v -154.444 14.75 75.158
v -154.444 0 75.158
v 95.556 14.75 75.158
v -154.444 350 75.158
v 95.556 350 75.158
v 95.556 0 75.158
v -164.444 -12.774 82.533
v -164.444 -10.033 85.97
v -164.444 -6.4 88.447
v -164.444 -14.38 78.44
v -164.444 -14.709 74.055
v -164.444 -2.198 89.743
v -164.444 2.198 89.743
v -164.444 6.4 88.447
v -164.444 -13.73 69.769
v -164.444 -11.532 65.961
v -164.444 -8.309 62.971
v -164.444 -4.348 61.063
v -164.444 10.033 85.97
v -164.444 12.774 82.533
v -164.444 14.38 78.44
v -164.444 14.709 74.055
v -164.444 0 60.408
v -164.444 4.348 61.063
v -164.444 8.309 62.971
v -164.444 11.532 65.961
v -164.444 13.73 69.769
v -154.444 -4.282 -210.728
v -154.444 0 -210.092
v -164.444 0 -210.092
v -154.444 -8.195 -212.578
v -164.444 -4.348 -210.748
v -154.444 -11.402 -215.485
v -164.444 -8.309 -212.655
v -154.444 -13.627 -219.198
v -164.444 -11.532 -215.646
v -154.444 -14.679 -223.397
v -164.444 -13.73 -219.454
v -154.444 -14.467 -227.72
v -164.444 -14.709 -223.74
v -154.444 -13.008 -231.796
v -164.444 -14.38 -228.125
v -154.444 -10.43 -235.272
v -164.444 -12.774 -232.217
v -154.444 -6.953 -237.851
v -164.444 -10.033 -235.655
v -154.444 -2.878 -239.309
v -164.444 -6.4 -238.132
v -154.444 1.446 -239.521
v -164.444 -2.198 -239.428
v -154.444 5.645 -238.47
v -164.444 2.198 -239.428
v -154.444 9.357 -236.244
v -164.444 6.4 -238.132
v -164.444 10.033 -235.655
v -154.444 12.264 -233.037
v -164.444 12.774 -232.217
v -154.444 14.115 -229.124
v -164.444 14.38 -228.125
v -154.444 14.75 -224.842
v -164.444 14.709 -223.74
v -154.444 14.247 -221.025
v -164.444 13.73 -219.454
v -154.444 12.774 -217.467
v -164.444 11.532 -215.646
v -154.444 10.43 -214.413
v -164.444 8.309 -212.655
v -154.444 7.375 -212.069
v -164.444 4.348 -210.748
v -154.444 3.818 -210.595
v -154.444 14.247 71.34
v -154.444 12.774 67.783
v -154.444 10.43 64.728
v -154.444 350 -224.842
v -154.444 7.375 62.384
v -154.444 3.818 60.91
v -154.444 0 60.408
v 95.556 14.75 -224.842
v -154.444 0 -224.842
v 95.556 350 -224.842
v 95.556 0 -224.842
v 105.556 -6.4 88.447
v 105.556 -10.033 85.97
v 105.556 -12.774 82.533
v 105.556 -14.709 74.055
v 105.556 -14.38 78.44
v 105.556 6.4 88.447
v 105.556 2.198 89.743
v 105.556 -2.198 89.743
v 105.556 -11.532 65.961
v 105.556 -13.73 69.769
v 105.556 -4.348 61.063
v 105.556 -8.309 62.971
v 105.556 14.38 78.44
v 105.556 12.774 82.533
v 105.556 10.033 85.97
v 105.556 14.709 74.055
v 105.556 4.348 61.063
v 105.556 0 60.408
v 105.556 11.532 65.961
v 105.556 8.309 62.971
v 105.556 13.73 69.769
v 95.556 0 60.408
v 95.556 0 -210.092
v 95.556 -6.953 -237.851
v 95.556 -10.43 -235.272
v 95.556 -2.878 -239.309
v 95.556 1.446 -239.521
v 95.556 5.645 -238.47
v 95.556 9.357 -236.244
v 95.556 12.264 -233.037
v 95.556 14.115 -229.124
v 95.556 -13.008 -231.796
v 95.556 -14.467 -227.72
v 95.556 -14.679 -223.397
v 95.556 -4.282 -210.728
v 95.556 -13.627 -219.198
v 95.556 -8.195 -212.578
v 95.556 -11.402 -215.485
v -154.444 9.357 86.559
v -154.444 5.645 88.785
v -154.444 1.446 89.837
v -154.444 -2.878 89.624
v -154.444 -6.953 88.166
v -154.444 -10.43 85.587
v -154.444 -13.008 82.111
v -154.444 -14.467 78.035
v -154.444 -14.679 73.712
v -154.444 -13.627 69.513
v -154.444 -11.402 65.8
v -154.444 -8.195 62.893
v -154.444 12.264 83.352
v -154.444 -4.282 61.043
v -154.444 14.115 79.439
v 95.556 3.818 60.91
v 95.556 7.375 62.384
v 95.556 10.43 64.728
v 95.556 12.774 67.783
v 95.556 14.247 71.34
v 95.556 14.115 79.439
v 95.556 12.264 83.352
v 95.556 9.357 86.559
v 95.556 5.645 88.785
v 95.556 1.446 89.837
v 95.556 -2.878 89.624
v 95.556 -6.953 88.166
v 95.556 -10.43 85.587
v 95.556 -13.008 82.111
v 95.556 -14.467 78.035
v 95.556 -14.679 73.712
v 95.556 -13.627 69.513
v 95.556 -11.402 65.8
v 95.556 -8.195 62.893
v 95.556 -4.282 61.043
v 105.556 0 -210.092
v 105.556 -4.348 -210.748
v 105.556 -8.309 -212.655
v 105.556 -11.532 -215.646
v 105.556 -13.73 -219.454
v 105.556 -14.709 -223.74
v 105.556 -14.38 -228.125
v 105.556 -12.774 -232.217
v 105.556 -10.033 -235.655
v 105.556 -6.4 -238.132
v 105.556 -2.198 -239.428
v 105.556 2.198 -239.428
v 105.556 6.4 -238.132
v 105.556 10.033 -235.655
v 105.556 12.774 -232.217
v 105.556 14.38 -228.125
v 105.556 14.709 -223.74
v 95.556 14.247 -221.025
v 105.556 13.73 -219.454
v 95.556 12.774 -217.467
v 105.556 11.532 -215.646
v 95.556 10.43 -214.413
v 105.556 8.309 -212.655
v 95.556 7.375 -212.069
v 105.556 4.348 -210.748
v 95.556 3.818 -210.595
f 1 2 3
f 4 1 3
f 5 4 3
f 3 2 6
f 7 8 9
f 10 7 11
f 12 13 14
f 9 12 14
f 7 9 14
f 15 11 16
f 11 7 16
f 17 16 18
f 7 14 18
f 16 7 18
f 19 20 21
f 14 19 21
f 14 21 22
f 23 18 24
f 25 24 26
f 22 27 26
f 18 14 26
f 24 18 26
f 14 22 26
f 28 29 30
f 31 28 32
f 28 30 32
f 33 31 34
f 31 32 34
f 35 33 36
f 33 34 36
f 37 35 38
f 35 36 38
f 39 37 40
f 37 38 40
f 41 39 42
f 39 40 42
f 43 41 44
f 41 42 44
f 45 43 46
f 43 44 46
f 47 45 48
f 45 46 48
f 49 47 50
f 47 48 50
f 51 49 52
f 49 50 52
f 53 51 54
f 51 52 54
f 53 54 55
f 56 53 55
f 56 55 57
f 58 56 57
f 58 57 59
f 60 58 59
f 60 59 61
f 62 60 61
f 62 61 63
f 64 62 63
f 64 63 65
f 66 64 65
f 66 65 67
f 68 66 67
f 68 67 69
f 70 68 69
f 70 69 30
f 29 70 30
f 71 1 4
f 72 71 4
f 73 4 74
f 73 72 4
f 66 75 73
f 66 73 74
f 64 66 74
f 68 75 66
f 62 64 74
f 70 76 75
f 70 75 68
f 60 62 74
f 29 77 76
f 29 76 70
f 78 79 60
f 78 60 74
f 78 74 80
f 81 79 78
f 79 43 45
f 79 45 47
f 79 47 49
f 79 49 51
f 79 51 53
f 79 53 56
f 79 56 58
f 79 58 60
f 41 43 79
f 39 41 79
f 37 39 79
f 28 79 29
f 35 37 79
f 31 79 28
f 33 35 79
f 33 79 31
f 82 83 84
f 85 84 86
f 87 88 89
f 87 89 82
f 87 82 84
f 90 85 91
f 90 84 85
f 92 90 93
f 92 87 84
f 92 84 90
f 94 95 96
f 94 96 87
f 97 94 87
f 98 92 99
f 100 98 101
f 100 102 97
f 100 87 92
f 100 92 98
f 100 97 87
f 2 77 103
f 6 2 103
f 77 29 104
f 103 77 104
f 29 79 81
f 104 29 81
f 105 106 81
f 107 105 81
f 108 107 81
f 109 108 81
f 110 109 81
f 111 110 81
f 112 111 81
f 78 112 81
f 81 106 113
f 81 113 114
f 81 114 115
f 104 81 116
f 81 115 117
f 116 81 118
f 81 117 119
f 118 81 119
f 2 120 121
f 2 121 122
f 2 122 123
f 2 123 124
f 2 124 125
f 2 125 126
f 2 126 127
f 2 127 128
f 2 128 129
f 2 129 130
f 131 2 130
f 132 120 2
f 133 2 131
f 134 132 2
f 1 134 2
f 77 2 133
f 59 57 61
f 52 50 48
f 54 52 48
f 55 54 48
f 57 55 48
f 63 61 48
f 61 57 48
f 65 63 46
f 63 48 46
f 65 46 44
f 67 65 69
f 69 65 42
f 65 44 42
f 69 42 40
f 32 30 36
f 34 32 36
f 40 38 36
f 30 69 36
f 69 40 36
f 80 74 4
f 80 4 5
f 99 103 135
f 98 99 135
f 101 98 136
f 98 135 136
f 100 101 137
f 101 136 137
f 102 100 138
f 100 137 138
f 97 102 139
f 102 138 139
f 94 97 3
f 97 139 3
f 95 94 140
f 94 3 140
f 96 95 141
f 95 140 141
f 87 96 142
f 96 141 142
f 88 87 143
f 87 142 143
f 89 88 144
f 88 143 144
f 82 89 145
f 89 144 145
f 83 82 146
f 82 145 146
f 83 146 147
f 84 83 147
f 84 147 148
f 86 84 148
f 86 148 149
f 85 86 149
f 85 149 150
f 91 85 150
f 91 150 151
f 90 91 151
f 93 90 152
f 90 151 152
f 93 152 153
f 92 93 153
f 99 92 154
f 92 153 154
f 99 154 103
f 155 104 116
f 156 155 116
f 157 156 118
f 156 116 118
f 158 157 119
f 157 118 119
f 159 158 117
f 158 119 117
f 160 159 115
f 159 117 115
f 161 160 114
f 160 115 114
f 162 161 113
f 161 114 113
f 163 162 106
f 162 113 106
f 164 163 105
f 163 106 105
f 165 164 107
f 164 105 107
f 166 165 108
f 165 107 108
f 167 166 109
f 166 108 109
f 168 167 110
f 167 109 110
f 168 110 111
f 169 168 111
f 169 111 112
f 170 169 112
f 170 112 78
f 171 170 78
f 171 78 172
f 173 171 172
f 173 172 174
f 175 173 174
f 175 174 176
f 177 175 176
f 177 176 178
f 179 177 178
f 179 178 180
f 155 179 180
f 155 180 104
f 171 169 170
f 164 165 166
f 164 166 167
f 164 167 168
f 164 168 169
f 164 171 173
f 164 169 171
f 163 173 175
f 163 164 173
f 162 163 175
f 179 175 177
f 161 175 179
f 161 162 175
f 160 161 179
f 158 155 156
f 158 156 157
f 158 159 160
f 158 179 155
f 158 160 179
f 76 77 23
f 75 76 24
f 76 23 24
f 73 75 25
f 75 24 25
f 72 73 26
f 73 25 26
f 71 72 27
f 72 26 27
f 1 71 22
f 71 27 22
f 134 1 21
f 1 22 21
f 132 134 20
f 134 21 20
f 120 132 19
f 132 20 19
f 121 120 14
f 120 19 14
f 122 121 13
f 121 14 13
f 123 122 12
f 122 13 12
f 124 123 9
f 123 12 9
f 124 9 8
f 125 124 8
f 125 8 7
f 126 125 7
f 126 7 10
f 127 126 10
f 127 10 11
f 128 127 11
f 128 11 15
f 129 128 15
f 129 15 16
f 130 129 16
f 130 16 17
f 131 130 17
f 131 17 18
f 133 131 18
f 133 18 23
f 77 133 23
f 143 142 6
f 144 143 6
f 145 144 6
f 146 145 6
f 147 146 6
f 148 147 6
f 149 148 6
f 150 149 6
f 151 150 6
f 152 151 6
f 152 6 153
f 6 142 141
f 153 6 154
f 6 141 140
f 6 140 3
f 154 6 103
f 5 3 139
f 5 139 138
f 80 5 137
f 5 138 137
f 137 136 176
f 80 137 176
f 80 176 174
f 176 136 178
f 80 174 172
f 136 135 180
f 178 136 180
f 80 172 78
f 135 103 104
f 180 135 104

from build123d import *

# Parameters (mm, degrees)
SKETCH1_W           = 250
SKETCH1_H           = 300
BOSS_EXTRUDE1_DEPTH = 350
SKETCH2_R           = 14.75
BOSS_EXTRUDE2_DEPTH = 10
LPATTERN2_COUNT     = 2
LPATTERN2_PITCH     = 260


with BuildPart() as part:
    # Sketch1 → Boss-Extrude1 (new body)
    with BuildSketch(Plane(origin=(0, 0, 0), x_dir=(1, 0, 0), z_dir=(0, 1, 0))):
        with Locations((-29.444356891, 74.84242821)):
            Rectangle(SKETCH1_W, SKETCH1_H)
    extrude(amount=BOSS_EXTRUDE1_DEPTH)

    # Sketch2 → Boss-Extrude2 (add)
    with BuildSketch(Plane(origin=(95.555643109, 0, 0), x_dir=(0, 0, -1), z_dir=(1, 0, 0))):
        with Locations((-75.15757179, 0)):
            Circle(SKETCH2_R)
        with Locations(Location((224.84242821, 0, 0), (0, 0, 180))):
            Circle(SKETCH2_R)
    boss_extrude2 = extrude(amount=BOSS_EXTRUDE2_DEPTH)

    # LPattern2: Boss-Extrude2 ×2
    with Locations(*[(-i * LPATTERN2_PITCH, 0, 0) for i in range(1, LPATTERN2_COUNT)]):
        add(boss_extrude2)


solid = part.part
